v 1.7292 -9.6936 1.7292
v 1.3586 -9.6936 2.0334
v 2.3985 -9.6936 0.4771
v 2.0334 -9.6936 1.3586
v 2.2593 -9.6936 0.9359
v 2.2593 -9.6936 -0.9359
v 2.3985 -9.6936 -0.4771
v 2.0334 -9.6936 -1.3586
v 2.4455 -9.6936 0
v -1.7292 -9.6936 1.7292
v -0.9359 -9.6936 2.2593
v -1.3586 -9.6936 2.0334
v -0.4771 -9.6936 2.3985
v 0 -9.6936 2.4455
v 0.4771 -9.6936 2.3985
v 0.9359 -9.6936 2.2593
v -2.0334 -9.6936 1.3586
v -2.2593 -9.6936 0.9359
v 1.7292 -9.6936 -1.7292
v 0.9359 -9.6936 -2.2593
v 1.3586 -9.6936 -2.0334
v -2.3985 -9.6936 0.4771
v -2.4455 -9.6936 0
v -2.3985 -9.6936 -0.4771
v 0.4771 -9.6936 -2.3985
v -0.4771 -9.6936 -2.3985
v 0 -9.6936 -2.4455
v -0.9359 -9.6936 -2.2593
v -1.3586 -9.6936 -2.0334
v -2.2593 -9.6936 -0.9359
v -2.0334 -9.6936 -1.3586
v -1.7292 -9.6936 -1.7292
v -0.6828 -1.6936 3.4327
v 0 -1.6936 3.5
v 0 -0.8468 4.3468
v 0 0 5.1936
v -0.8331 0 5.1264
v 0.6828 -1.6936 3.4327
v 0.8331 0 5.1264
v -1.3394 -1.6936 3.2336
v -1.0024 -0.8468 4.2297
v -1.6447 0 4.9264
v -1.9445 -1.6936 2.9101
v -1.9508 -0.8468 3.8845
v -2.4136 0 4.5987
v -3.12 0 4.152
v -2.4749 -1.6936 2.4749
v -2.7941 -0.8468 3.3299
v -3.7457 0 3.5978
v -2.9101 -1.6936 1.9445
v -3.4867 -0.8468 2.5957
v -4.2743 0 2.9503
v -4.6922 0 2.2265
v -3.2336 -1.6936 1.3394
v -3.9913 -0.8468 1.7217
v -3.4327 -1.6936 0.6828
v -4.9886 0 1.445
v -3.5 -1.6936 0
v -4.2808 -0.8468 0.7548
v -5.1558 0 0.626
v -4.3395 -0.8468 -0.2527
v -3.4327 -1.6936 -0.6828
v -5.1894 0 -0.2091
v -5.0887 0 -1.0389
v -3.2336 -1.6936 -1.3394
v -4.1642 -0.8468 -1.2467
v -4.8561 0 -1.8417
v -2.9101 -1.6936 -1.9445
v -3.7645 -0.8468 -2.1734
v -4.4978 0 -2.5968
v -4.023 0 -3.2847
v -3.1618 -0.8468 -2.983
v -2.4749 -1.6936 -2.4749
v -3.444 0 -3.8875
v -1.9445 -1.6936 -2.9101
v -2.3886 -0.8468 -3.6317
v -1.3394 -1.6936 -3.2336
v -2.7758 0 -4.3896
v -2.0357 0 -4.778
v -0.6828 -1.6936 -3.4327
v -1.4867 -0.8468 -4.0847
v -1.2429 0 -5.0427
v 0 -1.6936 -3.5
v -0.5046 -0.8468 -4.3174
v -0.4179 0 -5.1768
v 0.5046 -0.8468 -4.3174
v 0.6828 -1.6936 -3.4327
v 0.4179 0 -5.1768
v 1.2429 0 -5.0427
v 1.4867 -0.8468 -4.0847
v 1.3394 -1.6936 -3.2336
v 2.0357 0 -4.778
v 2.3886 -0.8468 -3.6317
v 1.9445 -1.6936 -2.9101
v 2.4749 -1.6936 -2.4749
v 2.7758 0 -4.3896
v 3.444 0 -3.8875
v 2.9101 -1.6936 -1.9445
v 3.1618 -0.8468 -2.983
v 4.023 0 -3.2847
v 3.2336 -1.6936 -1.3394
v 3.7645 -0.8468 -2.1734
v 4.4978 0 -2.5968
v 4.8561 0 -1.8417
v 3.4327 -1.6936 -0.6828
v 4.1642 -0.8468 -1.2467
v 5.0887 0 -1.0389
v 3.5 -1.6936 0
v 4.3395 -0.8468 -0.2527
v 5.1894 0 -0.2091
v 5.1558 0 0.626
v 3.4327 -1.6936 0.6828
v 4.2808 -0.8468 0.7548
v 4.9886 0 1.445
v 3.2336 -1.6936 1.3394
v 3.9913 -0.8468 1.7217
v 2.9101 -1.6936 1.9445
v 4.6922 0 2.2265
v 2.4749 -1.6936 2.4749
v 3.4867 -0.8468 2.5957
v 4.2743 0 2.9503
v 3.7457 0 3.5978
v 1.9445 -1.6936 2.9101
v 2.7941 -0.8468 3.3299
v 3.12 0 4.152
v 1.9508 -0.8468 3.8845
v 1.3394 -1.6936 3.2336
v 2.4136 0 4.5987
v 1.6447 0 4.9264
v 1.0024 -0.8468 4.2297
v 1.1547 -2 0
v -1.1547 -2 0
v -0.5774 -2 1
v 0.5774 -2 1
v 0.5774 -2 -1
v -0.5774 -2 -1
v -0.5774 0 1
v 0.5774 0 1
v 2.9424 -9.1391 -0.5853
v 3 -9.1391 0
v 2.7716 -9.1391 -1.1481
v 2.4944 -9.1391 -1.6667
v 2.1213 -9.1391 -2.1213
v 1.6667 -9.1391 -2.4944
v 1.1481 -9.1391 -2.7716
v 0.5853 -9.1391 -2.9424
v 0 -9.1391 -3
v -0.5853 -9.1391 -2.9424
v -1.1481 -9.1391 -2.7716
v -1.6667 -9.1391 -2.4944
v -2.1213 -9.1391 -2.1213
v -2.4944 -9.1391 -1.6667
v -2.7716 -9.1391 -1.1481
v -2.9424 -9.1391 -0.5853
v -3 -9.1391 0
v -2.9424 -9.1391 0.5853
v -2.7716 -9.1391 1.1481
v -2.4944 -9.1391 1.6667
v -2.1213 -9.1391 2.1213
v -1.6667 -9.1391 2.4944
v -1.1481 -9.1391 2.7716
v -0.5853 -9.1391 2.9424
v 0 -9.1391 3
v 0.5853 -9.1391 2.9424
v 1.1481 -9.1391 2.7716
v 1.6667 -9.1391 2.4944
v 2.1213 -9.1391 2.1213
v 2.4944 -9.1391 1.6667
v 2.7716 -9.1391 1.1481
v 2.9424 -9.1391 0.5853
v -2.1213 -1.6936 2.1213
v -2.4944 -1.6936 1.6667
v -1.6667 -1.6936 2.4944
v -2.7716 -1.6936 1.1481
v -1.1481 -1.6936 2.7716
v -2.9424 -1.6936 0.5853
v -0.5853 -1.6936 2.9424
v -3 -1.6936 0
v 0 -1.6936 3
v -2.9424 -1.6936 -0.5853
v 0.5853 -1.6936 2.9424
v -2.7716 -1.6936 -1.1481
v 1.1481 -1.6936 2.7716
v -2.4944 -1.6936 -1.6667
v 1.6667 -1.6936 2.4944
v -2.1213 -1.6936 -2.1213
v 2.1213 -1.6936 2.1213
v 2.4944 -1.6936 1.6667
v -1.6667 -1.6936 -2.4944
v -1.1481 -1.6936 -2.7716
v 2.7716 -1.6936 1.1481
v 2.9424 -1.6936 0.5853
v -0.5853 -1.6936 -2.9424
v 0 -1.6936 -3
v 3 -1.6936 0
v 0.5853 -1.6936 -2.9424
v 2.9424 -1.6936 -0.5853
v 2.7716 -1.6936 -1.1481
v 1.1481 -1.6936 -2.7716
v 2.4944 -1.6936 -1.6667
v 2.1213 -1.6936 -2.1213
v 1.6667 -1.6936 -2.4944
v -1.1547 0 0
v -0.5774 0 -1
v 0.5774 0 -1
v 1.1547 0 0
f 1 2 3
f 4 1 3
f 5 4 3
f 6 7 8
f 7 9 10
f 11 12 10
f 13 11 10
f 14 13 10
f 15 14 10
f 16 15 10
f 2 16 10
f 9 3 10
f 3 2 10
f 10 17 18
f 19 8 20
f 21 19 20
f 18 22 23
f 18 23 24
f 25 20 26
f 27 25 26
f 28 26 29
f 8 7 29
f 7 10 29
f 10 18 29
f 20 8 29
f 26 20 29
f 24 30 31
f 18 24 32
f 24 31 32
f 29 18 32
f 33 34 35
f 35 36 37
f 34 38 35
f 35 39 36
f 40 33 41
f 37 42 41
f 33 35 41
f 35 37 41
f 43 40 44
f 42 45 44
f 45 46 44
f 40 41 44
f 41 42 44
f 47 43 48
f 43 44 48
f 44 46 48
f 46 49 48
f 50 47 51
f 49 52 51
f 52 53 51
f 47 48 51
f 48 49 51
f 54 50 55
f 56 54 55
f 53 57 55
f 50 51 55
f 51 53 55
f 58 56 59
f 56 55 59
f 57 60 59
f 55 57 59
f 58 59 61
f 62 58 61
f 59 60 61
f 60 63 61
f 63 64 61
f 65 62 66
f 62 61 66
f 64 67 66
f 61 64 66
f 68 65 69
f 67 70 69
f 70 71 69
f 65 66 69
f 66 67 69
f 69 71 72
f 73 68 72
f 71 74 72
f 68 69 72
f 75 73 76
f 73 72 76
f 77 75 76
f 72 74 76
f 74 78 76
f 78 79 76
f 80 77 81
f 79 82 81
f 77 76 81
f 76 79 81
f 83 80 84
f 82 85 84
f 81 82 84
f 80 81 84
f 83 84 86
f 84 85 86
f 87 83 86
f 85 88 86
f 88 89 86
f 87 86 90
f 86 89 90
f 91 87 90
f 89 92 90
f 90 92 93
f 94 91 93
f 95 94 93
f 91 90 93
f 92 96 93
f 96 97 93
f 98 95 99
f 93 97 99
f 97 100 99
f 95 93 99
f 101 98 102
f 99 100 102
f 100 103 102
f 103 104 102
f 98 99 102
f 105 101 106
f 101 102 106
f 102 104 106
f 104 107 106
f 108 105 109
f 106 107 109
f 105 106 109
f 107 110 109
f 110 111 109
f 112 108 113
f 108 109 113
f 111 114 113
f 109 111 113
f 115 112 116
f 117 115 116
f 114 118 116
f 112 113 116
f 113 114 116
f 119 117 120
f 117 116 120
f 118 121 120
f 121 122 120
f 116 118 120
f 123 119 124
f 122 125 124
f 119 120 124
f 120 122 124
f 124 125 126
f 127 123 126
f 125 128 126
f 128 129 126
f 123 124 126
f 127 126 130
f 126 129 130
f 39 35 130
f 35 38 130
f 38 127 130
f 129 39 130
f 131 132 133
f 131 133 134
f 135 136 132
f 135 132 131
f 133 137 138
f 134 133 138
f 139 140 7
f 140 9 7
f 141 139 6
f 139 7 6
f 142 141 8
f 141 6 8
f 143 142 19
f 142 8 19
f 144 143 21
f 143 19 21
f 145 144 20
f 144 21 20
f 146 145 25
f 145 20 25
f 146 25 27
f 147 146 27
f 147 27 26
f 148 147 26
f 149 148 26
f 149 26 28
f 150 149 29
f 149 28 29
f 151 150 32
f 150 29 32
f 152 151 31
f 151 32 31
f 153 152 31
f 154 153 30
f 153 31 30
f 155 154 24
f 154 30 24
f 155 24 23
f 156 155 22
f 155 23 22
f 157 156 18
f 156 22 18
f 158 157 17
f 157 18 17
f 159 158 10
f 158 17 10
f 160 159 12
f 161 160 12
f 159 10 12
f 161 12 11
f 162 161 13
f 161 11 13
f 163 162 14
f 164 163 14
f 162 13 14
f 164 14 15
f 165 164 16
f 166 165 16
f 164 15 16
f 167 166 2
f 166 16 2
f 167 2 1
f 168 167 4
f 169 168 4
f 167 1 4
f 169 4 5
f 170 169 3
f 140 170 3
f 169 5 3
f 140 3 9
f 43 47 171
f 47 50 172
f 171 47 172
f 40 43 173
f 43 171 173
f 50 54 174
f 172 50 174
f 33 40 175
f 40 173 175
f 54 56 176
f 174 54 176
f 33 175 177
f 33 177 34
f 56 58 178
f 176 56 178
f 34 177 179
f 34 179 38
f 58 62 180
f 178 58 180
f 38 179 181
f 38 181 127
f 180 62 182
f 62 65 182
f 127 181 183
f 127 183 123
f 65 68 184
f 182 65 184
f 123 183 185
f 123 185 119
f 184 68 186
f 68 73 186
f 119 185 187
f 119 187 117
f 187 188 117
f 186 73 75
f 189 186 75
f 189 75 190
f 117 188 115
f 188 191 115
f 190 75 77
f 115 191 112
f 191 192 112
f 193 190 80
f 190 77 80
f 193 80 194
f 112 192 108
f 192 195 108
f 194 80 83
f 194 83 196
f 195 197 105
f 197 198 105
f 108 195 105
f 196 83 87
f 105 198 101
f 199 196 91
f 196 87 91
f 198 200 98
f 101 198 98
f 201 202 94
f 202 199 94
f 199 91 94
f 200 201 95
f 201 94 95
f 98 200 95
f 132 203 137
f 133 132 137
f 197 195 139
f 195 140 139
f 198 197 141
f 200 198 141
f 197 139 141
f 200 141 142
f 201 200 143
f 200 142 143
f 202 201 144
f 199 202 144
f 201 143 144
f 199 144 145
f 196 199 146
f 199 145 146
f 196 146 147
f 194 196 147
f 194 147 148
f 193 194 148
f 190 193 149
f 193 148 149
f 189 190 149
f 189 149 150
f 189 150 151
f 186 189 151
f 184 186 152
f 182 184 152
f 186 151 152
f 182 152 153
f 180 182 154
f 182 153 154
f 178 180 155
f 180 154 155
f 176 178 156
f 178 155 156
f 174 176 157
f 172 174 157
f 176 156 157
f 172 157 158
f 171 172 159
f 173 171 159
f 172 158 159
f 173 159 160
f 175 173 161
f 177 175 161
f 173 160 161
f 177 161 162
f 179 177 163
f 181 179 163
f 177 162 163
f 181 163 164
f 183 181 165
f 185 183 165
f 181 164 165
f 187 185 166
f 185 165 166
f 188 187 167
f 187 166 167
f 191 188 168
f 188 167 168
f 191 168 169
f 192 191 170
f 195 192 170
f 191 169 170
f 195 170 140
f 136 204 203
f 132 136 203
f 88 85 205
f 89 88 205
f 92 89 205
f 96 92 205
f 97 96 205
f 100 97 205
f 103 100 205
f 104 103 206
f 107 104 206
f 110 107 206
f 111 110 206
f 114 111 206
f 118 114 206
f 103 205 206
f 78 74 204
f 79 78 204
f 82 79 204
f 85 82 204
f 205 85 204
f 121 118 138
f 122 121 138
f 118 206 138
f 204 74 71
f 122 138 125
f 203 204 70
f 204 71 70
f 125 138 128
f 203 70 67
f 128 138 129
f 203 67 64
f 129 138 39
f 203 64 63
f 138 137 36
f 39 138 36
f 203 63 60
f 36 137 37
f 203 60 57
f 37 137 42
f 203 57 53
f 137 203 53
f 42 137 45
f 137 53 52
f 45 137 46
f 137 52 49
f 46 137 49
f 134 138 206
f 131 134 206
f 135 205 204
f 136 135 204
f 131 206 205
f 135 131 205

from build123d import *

# Parameters (mm, degrees)
SKETCH1_W          = 3.5
SKETCH1_H          = 8
CUT_EXTRUDE1_DEPTH = 2


# Read off the part's stored shape, not the designer's step: M6x1.0 Machine Threads Stud1
with BuildPart() as part:
    # Sketch1 → Revolve1 (revolve)
    with BuildSketch(Plane.XY, mode=Mode.PRIVATE) as revolve1_sk:
        with Locations((1.75, -5.693638198)):
            Rectangle(SKETCH1_W, SKETCH1_H)
        Polygon((5.193638198, 0), (0, 0), (0, -1.693638198), (3.5, -1.693638198), align=None)
    revolve(revolve1_sk.sketch.rotate(Axis((0, 39.805194805, 0), (0, -1, 0)), 90), axis=Axis((0, 39.805194805, 0), (0, -1, 0)))

    # Sketch2 → Cut-Extrude1 (cut)
    with BuildSketch(Plane(origin=(0, 0, 0), x_dir=(1, 0, 0), z_dir=(0, 1, 0))):
        Polygon((0.577350269, -1), (1.154700538, 0), (0.577350269, 1), (-0.577350269, 1), (-1.154700538, 0), (-0.577350269, -1), align=None)
    extrude(amount=-CUT_EXTRUDE1_DEPTH, mode=Mode.SUBTRACT)

    # M6x1.0 Machine Threads Stud1 outline → M6x1.0 Machine Threads Stud1 (revolve, cut)
    with BuildSketch(Plane.XY):
        Polygon((2.4455, -9.693638198), (3.5, -9.693638198), (3.5, -1.693638198), (3, -1.693638198), (3, -9.139138198), align=None)
    revolve(axis=Axis((0, 0, 0), (0, 1, 0)), mode=Mode.SUBTRACT)


solid = part.part
